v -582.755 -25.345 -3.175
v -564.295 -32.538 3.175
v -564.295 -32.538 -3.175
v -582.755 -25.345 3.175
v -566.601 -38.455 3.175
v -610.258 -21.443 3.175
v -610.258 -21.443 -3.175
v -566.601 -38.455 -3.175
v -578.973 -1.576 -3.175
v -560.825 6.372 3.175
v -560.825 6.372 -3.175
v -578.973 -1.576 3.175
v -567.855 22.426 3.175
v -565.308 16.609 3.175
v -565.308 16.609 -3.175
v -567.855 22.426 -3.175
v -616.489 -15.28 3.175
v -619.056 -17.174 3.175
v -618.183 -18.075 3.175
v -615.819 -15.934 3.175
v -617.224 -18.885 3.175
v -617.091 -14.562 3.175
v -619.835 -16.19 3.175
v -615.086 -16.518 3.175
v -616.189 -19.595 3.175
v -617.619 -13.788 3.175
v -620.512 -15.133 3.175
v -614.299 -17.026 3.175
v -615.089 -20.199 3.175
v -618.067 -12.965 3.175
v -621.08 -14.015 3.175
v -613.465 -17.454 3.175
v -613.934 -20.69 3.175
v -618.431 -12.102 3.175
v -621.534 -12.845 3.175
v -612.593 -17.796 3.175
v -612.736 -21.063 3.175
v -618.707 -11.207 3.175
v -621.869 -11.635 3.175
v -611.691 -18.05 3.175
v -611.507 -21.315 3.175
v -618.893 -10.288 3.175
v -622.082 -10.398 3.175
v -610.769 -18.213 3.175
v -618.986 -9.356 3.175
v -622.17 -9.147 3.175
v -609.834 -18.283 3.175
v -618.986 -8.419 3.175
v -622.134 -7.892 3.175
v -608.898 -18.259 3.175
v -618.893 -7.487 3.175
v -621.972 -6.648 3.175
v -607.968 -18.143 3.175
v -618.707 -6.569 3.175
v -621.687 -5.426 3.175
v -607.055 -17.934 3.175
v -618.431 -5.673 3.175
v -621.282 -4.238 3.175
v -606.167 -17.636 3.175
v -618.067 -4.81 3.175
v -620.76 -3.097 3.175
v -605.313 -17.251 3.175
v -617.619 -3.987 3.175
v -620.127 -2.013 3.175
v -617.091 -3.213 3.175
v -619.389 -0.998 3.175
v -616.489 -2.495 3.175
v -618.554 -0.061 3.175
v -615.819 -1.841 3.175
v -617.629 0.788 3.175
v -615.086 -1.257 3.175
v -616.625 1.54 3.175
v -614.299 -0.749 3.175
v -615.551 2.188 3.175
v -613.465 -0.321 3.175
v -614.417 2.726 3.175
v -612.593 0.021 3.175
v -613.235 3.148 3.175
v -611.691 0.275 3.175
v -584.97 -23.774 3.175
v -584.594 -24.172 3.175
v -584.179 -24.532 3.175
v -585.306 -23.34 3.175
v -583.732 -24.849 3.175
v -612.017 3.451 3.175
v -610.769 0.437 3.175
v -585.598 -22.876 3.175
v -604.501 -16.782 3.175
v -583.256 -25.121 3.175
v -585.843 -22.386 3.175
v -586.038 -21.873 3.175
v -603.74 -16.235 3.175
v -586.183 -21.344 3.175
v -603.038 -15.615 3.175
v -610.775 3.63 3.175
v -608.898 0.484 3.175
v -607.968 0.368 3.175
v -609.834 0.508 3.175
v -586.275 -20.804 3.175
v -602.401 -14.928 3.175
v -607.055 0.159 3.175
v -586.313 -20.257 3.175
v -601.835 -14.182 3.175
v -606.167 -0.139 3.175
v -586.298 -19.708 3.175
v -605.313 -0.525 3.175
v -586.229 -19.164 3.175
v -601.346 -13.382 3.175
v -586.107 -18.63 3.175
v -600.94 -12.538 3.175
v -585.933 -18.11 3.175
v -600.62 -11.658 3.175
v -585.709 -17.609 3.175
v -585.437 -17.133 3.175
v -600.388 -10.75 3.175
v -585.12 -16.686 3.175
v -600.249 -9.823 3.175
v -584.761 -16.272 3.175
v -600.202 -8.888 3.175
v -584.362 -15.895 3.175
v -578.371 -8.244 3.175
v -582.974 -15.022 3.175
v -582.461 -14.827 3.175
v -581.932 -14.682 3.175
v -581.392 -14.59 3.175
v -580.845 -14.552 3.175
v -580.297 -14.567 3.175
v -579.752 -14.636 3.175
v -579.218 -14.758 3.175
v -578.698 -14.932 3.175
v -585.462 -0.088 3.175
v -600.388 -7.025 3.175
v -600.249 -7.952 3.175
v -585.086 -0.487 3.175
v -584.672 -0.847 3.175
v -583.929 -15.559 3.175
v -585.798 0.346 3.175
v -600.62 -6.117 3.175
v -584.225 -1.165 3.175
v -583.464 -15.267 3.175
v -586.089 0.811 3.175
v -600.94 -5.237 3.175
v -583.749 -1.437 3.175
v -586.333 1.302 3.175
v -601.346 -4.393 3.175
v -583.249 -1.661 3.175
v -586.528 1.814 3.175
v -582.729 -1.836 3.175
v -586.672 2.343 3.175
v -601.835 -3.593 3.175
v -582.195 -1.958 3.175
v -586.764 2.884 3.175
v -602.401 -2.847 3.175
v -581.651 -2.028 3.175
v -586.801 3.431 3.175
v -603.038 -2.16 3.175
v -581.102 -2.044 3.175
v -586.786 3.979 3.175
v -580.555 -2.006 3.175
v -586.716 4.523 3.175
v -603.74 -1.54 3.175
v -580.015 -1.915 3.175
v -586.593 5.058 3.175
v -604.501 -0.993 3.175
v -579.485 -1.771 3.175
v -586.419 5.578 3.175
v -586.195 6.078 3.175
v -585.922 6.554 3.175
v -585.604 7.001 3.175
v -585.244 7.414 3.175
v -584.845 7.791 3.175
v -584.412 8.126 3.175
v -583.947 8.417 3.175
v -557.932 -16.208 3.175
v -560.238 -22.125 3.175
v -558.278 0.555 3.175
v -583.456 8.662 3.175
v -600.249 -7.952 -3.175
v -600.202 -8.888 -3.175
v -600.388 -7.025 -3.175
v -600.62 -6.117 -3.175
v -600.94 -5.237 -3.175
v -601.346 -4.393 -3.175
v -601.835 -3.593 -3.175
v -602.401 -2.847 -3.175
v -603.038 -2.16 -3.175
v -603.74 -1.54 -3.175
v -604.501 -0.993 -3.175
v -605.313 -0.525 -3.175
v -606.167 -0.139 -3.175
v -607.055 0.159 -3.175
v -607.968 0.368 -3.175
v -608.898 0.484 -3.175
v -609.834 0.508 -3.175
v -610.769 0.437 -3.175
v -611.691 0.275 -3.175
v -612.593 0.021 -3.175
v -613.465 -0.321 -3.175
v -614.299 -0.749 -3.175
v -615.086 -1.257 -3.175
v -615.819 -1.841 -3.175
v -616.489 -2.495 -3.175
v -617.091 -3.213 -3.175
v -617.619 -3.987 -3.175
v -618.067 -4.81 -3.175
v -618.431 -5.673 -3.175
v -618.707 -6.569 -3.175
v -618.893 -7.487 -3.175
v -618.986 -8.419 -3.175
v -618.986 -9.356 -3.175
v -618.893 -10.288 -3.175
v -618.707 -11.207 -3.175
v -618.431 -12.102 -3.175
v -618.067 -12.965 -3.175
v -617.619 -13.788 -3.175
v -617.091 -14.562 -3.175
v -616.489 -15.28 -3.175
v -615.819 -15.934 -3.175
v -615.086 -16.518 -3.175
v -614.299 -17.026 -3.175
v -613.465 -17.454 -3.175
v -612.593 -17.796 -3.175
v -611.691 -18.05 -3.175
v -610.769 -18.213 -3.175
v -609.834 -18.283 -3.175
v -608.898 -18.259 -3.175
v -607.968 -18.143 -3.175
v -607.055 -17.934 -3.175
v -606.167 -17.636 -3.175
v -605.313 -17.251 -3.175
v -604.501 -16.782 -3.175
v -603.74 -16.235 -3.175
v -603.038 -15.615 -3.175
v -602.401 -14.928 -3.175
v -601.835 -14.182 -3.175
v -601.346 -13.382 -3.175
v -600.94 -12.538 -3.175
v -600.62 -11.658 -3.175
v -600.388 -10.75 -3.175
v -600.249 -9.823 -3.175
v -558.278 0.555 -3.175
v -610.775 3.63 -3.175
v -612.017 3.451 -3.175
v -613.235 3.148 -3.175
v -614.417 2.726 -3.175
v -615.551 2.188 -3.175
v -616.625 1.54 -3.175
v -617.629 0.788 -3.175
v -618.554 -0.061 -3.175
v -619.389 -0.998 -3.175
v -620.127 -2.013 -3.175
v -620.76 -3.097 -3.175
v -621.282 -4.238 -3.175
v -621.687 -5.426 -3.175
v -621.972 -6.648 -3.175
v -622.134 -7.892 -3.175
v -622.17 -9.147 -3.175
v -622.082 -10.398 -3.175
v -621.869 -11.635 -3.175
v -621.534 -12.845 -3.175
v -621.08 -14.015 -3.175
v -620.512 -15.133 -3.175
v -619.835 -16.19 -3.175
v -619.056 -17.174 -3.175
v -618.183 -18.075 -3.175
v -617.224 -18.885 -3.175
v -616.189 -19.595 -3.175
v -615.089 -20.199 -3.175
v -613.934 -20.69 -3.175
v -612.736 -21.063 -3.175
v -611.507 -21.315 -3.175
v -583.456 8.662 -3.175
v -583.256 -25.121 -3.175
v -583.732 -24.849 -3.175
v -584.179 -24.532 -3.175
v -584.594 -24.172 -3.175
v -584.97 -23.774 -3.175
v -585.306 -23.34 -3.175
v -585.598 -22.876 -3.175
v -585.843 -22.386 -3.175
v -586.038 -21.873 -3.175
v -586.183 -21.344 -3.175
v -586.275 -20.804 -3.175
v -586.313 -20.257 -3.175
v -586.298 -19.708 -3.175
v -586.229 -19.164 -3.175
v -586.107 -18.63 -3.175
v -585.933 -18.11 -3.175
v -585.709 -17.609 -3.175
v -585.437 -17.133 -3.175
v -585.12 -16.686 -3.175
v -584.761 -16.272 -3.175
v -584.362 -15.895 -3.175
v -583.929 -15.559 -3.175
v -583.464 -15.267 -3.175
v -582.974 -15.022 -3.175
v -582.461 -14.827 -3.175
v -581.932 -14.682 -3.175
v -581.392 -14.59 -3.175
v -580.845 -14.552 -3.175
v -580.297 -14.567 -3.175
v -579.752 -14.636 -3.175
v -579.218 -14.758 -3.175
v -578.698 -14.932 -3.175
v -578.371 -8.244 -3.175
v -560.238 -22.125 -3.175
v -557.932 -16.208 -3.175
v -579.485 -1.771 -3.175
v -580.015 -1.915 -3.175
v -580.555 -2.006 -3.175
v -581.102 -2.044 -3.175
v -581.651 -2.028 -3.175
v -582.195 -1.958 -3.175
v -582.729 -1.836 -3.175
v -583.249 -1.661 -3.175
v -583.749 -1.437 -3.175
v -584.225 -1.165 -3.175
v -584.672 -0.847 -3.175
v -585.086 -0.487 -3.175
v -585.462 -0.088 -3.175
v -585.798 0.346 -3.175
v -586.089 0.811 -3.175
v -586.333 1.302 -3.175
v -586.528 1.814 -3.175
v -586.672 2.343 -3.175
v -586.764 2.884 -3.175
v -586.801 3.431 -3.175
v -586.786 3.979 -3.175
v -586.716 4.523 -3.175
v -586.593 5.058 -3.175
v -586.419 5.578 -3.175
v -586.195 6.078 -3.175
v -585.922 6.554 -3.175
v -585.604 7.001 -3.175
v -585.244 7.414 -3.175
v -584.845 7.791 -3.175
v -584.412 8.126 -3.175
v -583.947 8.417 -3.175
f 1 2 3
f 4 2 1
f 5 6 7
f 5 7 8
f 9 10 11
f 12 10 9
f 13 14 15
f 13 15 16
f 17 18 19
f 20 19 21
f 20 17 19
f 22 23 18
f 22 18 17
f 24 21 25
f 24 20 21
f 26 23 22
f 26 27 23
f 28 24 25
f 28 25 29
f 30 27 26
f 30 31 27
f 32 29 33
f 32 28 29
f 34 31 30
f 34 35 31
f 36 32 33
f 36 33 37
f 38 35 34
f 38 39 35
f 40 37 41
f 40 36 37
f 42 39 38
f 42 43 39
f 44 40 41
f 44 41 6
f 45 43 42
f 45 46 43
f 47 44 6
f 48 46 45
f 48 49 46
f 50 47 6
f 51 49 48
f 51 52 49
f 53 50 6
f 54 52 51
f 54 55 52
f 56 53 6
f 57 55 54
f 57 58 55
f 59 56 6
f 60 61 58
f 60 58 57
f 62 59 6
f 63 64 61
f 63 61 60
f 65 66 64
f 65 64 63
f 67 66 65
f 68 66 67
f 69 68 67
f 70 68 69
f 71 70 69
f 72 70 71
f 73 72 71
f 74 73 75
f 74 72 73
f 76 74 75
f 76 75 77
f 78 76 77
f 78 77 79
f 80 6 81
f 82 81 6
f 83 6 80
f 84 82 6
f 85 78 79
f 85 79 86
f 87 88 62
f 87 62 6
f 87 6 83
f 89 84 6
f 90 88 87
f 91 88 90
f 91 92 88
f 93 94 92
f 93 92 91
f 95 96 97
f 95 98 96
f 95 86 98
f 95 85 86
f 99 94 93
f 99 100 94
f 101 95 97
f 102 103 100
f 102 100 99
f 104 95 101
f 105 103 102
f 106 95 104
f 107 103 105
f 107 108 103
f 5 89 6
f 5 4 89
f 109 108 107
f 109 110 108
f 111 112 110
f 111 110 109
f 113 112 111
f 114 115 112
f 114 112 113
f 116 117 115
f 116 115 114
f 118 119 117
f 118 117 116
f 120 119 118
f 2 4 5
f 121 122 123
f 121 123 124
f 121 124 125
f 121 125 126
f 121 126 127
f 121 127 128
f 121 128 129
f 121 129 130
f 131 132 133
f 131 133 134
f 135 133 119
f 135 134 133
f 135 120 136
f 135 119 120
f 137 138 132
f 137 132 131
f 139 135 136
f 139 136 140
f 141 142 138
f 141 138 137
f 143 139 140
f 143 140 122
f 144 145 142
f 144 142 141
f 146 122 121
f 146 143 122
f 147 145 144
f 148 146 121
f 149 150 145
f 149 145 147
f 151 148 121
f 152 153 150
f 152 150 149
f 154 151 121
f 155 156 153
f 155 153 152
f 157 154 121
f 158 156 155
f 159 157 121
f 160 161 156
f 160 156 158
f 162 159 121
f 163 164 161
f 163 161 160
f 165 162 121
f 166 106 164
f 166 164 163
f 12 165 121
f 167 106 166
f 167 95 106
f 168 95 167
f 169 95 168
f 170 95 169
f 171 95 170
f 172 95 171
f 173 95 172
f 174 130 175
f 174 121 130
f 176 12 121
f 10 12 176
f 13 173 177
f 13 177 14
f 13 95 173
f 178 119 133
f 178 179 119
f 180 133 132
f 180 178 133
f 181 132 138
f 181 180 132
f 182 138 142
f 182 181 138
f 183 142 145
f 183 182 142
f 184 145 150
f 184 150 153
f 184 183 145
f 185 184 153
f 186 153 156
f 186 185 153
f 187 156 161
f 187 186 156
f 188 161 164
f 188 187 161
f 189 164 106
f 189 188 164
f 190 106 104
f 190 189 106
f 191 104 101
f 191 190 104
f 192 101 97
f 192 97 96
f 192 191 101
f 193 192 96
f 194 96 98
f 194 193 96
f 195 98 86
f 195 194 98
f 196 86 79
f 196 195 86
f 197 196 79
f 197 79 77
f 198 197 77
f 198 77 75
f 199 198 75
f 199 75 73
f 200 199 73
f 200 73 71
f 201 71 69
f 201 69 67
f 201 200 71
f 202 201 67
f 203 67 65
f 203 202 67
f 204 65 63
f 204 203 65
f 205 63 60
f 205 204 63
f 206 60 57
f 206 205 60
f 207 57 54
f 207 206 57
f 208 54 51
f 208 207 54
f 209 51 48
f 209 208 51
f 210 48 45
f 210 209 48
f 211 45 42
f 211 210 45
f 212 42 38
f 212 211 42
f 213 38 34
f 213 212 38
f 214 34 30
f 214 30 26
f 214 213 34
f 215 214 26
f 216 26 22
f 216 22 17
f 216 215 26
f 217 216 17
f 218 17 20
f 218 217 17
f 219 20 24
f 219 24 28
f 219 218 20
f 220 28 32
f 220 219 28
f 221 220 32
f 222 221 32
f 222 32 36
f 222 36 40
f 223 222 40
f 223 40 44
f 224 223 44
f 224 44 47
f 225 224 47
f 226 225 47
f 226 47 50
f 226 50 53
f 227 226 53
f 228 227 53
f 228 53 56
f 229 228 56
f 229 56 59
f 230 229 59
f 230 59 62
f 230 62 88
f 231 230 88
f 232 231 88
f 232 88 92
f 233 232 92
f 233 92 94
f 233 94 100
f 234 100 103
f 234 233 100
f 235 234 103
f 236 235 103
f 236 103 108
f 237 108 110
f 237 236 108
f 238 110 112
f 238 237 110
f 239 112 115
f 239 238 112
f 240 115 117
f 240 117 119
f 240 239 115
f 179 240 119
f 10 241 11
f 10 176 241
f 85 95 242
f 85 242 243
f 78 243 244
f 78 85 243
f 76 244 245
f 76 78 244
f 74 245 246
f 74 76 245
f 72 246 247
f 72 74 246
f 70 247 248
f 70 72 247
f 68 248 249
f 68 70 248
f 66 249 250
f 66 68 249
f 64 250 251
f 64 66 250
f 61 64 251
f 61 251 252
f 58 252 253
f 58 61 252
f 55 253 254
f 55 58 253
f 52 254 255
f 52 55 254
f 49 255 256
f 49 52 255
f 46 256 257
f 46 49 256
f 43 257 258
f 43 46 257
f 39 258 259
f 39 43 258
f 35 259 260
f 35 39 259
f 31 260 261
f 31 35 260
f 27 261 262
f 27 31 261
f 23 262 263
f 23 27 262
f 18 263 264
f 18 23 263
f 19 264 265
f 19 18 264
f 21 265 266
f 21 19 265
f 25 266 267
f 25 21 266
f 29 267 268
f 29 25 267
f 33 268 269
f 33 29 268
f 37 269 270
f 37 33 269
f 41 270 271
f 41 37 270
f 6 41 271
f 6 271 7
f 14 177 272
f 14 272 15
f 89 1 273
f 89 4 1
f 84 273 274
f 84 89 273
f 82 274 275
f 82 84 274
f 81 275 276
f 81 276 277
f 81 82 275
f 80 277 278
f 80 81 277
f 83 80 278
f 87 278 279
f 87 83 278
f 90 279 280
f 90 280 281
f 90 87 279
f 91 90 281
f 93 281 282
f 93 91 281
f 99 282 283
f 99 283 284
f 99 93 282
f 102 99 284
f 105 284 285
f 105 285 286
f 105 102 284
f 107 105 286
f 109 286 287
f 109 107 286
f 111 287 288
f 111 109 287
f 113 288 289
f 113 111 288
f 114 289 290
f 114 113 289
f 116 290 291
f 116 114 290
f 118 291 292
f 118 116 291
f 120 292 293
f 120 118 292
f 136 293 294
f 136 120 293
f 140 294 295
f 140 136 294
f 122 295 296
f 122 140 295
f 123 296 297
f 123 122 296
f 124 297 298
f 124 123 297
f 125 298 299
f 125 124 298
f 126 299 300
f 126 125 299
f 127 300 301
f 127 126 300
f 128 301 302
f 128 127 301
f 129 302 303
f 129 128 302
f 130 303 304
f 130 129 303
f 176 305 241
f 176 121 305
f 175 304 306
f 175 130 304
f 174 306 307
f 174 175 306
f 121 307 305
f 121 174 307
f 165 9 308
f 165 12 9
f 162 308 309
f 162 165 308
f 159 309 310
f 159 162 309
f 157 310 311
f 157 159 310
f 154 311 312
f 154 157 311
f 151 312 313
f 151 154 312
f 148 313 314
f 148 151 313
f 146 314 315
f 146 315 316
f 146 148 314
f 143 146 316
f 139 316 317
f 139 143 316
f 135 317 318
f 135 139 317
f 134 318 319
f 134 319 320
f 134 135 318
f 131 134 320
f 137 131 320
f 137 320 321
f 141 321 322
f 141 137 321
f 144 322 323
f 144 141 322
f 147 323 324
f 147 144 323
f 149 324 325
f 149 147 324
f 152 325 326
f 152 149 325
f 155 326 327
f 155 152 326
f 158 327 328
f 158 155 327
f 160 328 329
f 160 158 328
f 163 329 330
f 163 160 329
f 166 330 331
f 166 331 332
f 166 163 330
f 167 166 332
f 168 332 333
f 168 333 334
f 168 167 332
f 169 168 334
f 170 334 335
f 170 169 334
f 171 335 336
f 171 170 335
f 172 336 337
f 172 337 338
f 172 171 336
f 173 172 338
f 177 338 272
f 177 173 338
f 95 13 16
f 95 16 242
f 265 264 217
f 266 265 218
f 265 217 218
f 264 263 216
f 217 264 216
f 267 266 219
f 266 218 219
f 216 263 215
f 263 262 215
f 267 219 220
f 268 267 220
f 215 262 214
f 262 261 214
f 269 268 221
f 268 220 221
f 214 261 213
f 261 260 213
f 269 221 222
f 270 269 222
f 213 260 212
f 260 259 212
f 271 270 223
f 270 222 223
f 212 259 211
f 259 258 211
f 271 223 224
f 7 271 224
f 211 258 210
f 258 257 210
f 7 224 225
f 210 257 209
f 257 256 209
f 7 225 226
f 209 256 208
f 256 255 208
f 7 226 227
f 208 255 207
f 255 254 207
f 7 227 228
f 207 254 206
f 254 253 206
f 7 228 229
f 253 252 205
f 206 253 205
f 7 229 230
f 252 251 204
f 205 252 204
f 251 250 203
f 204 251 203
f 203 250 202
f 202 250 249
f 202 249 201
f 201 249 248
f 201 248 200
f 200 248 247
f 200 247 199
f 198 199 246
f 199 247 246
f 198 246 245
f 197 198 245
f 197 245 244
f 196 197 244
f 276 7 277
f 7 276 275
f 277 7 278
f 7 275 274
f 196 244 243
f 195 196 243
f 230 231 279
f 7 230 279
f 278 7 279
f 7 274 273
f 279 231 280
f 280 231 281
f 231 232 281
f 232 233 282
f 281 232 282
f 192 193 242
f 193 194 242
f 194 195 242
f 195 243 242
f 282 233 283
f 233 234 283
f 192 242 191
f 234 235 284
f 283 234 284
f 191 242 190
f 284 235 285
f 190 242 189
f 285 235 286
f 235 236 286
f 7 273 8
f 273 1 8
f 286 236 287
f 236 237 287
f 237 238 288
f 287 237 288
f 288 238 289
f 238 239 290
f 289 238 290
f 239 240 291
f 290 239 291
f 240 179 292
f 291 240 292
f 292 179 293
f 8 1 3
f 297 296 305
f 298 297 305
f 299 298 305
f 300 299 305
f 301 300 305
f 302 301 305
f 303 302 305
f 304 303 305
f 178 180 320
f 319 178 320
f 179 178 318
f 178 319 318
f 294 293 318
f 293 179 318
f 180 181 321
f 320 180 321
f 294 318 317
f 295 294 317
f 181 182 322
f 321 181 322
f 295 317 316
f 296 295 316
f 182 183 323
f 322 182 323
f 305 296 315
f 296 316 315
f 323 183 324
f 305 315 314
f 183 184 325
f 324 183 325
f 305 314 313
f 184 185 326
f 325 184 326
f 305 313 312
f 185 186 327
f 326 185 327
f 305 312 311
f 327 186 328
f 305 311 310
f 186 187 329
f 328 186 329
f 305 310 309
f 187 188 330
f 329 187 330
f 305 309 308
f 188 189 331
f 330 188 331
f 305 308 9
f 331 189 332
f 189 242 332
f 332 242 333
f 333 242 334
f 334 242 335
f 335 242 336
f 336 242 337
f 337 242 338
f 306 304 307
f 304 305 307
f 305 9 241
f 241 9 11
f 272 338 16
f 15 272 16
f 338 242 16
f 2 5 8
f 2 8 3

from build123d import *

# Parameters (mm, degrees)
SKETCH1_R           = 12.573
SKETCH1_R_2         = 9.398
BOSS_EXTRUDE1_DEPTH = 3.175


with BuildPart() as part:
    # Sketch1 → Boss-Extrude1 (new body, symmetric)
    with BuildSketch(Plane.XY):
        with BuildLine():
            ThreePointArc((-578.972943543, -1.57558157), (-586.333231698, 1.301508328), (-583.456141799, 8.661796483))
            Line((-583.456141799, 8.661796483), (-565.308062523, 16.6092843))
            Line((-565.308062523, 16.6092843), (-567.855334259, 22.425976375))
            Line((-567.855334259, 22.425976375), (-610.775024162, 3.630394351))
            ThreePointArc((-610.775024162, 3.630394351), (-605.901582727, 3.129161319), (-601.589679699, 0.803401606))
            Line((-601.589679699, 0.803401606), (-578.370817834, -8.244100669))
            Line((-578.370817834, -8.244100669), (-558.277592531, 0.555214171))
            Line((-558.277592531, 0.555214171), (-560.824864268, 6.371906247))
            Line((-560.824864268, 6.371906247), (-578.972943543, -1.57558157))
        make_face()
        with BuildLine():
            Line((-578.370817834, -8.244100669), (-601.589679699, 0.803401606))
            ThreePointArc((-601.589679699, 0.803401606), (-598.22471789, -3.531900701), (-597.027, -8.887578616))
            ThreePointArc((-597.027, -8.887578616), (-598.11680147, -14.007781788), (-601.197282434, -18.240367853))
            Line((-601.197282434, -18.240367853), (-578.370817834, -8.244100669))
        make_face()
        with BuildLine():
            ThreePointArc((-601.197282434, -18.240367853), (-605.409721654, -20.741771815), (-610.258379573, -21.443328906))
            Line((-610.258379573, -21.443328906), (-566.600880762, -38.454986158))
            Line((-566.600880762, -38.454986158), (-564.295375476, -32.538302511))
            Line((-564.295375476, -32.538302511), (-582.755428455, -25.34512602))
            ThreePointArc((-582.755428455, -25.34512602), (-585.933265412, -18.109599759), (-578.697739152, -14.931762801))
            Line((-578.697739152, -14.931762801), (-560.237686173, -22.124939293))
            Line((-560.237686173, -22.124939293), (-557.932180888, -16.208255646))
            Line((-557.932180888, -16.208255646), (-578.370817834, -8.244100669))
            Line((-578.370817834, -8.244100669), (-601.197282434, -18.240367853))
        make_face()
        with Locations((-609.6, -8.887578616)):
            Circle(SKETCH1_R)
        with Locations((-609.6, -8.887578616)):
            Circle(SKETCH1_R_2, mode=Mode.SUBTRACT)
    extrude(amount=BOSS_EXTRUDE1_DEPTH, both=True)


solid = part.part
